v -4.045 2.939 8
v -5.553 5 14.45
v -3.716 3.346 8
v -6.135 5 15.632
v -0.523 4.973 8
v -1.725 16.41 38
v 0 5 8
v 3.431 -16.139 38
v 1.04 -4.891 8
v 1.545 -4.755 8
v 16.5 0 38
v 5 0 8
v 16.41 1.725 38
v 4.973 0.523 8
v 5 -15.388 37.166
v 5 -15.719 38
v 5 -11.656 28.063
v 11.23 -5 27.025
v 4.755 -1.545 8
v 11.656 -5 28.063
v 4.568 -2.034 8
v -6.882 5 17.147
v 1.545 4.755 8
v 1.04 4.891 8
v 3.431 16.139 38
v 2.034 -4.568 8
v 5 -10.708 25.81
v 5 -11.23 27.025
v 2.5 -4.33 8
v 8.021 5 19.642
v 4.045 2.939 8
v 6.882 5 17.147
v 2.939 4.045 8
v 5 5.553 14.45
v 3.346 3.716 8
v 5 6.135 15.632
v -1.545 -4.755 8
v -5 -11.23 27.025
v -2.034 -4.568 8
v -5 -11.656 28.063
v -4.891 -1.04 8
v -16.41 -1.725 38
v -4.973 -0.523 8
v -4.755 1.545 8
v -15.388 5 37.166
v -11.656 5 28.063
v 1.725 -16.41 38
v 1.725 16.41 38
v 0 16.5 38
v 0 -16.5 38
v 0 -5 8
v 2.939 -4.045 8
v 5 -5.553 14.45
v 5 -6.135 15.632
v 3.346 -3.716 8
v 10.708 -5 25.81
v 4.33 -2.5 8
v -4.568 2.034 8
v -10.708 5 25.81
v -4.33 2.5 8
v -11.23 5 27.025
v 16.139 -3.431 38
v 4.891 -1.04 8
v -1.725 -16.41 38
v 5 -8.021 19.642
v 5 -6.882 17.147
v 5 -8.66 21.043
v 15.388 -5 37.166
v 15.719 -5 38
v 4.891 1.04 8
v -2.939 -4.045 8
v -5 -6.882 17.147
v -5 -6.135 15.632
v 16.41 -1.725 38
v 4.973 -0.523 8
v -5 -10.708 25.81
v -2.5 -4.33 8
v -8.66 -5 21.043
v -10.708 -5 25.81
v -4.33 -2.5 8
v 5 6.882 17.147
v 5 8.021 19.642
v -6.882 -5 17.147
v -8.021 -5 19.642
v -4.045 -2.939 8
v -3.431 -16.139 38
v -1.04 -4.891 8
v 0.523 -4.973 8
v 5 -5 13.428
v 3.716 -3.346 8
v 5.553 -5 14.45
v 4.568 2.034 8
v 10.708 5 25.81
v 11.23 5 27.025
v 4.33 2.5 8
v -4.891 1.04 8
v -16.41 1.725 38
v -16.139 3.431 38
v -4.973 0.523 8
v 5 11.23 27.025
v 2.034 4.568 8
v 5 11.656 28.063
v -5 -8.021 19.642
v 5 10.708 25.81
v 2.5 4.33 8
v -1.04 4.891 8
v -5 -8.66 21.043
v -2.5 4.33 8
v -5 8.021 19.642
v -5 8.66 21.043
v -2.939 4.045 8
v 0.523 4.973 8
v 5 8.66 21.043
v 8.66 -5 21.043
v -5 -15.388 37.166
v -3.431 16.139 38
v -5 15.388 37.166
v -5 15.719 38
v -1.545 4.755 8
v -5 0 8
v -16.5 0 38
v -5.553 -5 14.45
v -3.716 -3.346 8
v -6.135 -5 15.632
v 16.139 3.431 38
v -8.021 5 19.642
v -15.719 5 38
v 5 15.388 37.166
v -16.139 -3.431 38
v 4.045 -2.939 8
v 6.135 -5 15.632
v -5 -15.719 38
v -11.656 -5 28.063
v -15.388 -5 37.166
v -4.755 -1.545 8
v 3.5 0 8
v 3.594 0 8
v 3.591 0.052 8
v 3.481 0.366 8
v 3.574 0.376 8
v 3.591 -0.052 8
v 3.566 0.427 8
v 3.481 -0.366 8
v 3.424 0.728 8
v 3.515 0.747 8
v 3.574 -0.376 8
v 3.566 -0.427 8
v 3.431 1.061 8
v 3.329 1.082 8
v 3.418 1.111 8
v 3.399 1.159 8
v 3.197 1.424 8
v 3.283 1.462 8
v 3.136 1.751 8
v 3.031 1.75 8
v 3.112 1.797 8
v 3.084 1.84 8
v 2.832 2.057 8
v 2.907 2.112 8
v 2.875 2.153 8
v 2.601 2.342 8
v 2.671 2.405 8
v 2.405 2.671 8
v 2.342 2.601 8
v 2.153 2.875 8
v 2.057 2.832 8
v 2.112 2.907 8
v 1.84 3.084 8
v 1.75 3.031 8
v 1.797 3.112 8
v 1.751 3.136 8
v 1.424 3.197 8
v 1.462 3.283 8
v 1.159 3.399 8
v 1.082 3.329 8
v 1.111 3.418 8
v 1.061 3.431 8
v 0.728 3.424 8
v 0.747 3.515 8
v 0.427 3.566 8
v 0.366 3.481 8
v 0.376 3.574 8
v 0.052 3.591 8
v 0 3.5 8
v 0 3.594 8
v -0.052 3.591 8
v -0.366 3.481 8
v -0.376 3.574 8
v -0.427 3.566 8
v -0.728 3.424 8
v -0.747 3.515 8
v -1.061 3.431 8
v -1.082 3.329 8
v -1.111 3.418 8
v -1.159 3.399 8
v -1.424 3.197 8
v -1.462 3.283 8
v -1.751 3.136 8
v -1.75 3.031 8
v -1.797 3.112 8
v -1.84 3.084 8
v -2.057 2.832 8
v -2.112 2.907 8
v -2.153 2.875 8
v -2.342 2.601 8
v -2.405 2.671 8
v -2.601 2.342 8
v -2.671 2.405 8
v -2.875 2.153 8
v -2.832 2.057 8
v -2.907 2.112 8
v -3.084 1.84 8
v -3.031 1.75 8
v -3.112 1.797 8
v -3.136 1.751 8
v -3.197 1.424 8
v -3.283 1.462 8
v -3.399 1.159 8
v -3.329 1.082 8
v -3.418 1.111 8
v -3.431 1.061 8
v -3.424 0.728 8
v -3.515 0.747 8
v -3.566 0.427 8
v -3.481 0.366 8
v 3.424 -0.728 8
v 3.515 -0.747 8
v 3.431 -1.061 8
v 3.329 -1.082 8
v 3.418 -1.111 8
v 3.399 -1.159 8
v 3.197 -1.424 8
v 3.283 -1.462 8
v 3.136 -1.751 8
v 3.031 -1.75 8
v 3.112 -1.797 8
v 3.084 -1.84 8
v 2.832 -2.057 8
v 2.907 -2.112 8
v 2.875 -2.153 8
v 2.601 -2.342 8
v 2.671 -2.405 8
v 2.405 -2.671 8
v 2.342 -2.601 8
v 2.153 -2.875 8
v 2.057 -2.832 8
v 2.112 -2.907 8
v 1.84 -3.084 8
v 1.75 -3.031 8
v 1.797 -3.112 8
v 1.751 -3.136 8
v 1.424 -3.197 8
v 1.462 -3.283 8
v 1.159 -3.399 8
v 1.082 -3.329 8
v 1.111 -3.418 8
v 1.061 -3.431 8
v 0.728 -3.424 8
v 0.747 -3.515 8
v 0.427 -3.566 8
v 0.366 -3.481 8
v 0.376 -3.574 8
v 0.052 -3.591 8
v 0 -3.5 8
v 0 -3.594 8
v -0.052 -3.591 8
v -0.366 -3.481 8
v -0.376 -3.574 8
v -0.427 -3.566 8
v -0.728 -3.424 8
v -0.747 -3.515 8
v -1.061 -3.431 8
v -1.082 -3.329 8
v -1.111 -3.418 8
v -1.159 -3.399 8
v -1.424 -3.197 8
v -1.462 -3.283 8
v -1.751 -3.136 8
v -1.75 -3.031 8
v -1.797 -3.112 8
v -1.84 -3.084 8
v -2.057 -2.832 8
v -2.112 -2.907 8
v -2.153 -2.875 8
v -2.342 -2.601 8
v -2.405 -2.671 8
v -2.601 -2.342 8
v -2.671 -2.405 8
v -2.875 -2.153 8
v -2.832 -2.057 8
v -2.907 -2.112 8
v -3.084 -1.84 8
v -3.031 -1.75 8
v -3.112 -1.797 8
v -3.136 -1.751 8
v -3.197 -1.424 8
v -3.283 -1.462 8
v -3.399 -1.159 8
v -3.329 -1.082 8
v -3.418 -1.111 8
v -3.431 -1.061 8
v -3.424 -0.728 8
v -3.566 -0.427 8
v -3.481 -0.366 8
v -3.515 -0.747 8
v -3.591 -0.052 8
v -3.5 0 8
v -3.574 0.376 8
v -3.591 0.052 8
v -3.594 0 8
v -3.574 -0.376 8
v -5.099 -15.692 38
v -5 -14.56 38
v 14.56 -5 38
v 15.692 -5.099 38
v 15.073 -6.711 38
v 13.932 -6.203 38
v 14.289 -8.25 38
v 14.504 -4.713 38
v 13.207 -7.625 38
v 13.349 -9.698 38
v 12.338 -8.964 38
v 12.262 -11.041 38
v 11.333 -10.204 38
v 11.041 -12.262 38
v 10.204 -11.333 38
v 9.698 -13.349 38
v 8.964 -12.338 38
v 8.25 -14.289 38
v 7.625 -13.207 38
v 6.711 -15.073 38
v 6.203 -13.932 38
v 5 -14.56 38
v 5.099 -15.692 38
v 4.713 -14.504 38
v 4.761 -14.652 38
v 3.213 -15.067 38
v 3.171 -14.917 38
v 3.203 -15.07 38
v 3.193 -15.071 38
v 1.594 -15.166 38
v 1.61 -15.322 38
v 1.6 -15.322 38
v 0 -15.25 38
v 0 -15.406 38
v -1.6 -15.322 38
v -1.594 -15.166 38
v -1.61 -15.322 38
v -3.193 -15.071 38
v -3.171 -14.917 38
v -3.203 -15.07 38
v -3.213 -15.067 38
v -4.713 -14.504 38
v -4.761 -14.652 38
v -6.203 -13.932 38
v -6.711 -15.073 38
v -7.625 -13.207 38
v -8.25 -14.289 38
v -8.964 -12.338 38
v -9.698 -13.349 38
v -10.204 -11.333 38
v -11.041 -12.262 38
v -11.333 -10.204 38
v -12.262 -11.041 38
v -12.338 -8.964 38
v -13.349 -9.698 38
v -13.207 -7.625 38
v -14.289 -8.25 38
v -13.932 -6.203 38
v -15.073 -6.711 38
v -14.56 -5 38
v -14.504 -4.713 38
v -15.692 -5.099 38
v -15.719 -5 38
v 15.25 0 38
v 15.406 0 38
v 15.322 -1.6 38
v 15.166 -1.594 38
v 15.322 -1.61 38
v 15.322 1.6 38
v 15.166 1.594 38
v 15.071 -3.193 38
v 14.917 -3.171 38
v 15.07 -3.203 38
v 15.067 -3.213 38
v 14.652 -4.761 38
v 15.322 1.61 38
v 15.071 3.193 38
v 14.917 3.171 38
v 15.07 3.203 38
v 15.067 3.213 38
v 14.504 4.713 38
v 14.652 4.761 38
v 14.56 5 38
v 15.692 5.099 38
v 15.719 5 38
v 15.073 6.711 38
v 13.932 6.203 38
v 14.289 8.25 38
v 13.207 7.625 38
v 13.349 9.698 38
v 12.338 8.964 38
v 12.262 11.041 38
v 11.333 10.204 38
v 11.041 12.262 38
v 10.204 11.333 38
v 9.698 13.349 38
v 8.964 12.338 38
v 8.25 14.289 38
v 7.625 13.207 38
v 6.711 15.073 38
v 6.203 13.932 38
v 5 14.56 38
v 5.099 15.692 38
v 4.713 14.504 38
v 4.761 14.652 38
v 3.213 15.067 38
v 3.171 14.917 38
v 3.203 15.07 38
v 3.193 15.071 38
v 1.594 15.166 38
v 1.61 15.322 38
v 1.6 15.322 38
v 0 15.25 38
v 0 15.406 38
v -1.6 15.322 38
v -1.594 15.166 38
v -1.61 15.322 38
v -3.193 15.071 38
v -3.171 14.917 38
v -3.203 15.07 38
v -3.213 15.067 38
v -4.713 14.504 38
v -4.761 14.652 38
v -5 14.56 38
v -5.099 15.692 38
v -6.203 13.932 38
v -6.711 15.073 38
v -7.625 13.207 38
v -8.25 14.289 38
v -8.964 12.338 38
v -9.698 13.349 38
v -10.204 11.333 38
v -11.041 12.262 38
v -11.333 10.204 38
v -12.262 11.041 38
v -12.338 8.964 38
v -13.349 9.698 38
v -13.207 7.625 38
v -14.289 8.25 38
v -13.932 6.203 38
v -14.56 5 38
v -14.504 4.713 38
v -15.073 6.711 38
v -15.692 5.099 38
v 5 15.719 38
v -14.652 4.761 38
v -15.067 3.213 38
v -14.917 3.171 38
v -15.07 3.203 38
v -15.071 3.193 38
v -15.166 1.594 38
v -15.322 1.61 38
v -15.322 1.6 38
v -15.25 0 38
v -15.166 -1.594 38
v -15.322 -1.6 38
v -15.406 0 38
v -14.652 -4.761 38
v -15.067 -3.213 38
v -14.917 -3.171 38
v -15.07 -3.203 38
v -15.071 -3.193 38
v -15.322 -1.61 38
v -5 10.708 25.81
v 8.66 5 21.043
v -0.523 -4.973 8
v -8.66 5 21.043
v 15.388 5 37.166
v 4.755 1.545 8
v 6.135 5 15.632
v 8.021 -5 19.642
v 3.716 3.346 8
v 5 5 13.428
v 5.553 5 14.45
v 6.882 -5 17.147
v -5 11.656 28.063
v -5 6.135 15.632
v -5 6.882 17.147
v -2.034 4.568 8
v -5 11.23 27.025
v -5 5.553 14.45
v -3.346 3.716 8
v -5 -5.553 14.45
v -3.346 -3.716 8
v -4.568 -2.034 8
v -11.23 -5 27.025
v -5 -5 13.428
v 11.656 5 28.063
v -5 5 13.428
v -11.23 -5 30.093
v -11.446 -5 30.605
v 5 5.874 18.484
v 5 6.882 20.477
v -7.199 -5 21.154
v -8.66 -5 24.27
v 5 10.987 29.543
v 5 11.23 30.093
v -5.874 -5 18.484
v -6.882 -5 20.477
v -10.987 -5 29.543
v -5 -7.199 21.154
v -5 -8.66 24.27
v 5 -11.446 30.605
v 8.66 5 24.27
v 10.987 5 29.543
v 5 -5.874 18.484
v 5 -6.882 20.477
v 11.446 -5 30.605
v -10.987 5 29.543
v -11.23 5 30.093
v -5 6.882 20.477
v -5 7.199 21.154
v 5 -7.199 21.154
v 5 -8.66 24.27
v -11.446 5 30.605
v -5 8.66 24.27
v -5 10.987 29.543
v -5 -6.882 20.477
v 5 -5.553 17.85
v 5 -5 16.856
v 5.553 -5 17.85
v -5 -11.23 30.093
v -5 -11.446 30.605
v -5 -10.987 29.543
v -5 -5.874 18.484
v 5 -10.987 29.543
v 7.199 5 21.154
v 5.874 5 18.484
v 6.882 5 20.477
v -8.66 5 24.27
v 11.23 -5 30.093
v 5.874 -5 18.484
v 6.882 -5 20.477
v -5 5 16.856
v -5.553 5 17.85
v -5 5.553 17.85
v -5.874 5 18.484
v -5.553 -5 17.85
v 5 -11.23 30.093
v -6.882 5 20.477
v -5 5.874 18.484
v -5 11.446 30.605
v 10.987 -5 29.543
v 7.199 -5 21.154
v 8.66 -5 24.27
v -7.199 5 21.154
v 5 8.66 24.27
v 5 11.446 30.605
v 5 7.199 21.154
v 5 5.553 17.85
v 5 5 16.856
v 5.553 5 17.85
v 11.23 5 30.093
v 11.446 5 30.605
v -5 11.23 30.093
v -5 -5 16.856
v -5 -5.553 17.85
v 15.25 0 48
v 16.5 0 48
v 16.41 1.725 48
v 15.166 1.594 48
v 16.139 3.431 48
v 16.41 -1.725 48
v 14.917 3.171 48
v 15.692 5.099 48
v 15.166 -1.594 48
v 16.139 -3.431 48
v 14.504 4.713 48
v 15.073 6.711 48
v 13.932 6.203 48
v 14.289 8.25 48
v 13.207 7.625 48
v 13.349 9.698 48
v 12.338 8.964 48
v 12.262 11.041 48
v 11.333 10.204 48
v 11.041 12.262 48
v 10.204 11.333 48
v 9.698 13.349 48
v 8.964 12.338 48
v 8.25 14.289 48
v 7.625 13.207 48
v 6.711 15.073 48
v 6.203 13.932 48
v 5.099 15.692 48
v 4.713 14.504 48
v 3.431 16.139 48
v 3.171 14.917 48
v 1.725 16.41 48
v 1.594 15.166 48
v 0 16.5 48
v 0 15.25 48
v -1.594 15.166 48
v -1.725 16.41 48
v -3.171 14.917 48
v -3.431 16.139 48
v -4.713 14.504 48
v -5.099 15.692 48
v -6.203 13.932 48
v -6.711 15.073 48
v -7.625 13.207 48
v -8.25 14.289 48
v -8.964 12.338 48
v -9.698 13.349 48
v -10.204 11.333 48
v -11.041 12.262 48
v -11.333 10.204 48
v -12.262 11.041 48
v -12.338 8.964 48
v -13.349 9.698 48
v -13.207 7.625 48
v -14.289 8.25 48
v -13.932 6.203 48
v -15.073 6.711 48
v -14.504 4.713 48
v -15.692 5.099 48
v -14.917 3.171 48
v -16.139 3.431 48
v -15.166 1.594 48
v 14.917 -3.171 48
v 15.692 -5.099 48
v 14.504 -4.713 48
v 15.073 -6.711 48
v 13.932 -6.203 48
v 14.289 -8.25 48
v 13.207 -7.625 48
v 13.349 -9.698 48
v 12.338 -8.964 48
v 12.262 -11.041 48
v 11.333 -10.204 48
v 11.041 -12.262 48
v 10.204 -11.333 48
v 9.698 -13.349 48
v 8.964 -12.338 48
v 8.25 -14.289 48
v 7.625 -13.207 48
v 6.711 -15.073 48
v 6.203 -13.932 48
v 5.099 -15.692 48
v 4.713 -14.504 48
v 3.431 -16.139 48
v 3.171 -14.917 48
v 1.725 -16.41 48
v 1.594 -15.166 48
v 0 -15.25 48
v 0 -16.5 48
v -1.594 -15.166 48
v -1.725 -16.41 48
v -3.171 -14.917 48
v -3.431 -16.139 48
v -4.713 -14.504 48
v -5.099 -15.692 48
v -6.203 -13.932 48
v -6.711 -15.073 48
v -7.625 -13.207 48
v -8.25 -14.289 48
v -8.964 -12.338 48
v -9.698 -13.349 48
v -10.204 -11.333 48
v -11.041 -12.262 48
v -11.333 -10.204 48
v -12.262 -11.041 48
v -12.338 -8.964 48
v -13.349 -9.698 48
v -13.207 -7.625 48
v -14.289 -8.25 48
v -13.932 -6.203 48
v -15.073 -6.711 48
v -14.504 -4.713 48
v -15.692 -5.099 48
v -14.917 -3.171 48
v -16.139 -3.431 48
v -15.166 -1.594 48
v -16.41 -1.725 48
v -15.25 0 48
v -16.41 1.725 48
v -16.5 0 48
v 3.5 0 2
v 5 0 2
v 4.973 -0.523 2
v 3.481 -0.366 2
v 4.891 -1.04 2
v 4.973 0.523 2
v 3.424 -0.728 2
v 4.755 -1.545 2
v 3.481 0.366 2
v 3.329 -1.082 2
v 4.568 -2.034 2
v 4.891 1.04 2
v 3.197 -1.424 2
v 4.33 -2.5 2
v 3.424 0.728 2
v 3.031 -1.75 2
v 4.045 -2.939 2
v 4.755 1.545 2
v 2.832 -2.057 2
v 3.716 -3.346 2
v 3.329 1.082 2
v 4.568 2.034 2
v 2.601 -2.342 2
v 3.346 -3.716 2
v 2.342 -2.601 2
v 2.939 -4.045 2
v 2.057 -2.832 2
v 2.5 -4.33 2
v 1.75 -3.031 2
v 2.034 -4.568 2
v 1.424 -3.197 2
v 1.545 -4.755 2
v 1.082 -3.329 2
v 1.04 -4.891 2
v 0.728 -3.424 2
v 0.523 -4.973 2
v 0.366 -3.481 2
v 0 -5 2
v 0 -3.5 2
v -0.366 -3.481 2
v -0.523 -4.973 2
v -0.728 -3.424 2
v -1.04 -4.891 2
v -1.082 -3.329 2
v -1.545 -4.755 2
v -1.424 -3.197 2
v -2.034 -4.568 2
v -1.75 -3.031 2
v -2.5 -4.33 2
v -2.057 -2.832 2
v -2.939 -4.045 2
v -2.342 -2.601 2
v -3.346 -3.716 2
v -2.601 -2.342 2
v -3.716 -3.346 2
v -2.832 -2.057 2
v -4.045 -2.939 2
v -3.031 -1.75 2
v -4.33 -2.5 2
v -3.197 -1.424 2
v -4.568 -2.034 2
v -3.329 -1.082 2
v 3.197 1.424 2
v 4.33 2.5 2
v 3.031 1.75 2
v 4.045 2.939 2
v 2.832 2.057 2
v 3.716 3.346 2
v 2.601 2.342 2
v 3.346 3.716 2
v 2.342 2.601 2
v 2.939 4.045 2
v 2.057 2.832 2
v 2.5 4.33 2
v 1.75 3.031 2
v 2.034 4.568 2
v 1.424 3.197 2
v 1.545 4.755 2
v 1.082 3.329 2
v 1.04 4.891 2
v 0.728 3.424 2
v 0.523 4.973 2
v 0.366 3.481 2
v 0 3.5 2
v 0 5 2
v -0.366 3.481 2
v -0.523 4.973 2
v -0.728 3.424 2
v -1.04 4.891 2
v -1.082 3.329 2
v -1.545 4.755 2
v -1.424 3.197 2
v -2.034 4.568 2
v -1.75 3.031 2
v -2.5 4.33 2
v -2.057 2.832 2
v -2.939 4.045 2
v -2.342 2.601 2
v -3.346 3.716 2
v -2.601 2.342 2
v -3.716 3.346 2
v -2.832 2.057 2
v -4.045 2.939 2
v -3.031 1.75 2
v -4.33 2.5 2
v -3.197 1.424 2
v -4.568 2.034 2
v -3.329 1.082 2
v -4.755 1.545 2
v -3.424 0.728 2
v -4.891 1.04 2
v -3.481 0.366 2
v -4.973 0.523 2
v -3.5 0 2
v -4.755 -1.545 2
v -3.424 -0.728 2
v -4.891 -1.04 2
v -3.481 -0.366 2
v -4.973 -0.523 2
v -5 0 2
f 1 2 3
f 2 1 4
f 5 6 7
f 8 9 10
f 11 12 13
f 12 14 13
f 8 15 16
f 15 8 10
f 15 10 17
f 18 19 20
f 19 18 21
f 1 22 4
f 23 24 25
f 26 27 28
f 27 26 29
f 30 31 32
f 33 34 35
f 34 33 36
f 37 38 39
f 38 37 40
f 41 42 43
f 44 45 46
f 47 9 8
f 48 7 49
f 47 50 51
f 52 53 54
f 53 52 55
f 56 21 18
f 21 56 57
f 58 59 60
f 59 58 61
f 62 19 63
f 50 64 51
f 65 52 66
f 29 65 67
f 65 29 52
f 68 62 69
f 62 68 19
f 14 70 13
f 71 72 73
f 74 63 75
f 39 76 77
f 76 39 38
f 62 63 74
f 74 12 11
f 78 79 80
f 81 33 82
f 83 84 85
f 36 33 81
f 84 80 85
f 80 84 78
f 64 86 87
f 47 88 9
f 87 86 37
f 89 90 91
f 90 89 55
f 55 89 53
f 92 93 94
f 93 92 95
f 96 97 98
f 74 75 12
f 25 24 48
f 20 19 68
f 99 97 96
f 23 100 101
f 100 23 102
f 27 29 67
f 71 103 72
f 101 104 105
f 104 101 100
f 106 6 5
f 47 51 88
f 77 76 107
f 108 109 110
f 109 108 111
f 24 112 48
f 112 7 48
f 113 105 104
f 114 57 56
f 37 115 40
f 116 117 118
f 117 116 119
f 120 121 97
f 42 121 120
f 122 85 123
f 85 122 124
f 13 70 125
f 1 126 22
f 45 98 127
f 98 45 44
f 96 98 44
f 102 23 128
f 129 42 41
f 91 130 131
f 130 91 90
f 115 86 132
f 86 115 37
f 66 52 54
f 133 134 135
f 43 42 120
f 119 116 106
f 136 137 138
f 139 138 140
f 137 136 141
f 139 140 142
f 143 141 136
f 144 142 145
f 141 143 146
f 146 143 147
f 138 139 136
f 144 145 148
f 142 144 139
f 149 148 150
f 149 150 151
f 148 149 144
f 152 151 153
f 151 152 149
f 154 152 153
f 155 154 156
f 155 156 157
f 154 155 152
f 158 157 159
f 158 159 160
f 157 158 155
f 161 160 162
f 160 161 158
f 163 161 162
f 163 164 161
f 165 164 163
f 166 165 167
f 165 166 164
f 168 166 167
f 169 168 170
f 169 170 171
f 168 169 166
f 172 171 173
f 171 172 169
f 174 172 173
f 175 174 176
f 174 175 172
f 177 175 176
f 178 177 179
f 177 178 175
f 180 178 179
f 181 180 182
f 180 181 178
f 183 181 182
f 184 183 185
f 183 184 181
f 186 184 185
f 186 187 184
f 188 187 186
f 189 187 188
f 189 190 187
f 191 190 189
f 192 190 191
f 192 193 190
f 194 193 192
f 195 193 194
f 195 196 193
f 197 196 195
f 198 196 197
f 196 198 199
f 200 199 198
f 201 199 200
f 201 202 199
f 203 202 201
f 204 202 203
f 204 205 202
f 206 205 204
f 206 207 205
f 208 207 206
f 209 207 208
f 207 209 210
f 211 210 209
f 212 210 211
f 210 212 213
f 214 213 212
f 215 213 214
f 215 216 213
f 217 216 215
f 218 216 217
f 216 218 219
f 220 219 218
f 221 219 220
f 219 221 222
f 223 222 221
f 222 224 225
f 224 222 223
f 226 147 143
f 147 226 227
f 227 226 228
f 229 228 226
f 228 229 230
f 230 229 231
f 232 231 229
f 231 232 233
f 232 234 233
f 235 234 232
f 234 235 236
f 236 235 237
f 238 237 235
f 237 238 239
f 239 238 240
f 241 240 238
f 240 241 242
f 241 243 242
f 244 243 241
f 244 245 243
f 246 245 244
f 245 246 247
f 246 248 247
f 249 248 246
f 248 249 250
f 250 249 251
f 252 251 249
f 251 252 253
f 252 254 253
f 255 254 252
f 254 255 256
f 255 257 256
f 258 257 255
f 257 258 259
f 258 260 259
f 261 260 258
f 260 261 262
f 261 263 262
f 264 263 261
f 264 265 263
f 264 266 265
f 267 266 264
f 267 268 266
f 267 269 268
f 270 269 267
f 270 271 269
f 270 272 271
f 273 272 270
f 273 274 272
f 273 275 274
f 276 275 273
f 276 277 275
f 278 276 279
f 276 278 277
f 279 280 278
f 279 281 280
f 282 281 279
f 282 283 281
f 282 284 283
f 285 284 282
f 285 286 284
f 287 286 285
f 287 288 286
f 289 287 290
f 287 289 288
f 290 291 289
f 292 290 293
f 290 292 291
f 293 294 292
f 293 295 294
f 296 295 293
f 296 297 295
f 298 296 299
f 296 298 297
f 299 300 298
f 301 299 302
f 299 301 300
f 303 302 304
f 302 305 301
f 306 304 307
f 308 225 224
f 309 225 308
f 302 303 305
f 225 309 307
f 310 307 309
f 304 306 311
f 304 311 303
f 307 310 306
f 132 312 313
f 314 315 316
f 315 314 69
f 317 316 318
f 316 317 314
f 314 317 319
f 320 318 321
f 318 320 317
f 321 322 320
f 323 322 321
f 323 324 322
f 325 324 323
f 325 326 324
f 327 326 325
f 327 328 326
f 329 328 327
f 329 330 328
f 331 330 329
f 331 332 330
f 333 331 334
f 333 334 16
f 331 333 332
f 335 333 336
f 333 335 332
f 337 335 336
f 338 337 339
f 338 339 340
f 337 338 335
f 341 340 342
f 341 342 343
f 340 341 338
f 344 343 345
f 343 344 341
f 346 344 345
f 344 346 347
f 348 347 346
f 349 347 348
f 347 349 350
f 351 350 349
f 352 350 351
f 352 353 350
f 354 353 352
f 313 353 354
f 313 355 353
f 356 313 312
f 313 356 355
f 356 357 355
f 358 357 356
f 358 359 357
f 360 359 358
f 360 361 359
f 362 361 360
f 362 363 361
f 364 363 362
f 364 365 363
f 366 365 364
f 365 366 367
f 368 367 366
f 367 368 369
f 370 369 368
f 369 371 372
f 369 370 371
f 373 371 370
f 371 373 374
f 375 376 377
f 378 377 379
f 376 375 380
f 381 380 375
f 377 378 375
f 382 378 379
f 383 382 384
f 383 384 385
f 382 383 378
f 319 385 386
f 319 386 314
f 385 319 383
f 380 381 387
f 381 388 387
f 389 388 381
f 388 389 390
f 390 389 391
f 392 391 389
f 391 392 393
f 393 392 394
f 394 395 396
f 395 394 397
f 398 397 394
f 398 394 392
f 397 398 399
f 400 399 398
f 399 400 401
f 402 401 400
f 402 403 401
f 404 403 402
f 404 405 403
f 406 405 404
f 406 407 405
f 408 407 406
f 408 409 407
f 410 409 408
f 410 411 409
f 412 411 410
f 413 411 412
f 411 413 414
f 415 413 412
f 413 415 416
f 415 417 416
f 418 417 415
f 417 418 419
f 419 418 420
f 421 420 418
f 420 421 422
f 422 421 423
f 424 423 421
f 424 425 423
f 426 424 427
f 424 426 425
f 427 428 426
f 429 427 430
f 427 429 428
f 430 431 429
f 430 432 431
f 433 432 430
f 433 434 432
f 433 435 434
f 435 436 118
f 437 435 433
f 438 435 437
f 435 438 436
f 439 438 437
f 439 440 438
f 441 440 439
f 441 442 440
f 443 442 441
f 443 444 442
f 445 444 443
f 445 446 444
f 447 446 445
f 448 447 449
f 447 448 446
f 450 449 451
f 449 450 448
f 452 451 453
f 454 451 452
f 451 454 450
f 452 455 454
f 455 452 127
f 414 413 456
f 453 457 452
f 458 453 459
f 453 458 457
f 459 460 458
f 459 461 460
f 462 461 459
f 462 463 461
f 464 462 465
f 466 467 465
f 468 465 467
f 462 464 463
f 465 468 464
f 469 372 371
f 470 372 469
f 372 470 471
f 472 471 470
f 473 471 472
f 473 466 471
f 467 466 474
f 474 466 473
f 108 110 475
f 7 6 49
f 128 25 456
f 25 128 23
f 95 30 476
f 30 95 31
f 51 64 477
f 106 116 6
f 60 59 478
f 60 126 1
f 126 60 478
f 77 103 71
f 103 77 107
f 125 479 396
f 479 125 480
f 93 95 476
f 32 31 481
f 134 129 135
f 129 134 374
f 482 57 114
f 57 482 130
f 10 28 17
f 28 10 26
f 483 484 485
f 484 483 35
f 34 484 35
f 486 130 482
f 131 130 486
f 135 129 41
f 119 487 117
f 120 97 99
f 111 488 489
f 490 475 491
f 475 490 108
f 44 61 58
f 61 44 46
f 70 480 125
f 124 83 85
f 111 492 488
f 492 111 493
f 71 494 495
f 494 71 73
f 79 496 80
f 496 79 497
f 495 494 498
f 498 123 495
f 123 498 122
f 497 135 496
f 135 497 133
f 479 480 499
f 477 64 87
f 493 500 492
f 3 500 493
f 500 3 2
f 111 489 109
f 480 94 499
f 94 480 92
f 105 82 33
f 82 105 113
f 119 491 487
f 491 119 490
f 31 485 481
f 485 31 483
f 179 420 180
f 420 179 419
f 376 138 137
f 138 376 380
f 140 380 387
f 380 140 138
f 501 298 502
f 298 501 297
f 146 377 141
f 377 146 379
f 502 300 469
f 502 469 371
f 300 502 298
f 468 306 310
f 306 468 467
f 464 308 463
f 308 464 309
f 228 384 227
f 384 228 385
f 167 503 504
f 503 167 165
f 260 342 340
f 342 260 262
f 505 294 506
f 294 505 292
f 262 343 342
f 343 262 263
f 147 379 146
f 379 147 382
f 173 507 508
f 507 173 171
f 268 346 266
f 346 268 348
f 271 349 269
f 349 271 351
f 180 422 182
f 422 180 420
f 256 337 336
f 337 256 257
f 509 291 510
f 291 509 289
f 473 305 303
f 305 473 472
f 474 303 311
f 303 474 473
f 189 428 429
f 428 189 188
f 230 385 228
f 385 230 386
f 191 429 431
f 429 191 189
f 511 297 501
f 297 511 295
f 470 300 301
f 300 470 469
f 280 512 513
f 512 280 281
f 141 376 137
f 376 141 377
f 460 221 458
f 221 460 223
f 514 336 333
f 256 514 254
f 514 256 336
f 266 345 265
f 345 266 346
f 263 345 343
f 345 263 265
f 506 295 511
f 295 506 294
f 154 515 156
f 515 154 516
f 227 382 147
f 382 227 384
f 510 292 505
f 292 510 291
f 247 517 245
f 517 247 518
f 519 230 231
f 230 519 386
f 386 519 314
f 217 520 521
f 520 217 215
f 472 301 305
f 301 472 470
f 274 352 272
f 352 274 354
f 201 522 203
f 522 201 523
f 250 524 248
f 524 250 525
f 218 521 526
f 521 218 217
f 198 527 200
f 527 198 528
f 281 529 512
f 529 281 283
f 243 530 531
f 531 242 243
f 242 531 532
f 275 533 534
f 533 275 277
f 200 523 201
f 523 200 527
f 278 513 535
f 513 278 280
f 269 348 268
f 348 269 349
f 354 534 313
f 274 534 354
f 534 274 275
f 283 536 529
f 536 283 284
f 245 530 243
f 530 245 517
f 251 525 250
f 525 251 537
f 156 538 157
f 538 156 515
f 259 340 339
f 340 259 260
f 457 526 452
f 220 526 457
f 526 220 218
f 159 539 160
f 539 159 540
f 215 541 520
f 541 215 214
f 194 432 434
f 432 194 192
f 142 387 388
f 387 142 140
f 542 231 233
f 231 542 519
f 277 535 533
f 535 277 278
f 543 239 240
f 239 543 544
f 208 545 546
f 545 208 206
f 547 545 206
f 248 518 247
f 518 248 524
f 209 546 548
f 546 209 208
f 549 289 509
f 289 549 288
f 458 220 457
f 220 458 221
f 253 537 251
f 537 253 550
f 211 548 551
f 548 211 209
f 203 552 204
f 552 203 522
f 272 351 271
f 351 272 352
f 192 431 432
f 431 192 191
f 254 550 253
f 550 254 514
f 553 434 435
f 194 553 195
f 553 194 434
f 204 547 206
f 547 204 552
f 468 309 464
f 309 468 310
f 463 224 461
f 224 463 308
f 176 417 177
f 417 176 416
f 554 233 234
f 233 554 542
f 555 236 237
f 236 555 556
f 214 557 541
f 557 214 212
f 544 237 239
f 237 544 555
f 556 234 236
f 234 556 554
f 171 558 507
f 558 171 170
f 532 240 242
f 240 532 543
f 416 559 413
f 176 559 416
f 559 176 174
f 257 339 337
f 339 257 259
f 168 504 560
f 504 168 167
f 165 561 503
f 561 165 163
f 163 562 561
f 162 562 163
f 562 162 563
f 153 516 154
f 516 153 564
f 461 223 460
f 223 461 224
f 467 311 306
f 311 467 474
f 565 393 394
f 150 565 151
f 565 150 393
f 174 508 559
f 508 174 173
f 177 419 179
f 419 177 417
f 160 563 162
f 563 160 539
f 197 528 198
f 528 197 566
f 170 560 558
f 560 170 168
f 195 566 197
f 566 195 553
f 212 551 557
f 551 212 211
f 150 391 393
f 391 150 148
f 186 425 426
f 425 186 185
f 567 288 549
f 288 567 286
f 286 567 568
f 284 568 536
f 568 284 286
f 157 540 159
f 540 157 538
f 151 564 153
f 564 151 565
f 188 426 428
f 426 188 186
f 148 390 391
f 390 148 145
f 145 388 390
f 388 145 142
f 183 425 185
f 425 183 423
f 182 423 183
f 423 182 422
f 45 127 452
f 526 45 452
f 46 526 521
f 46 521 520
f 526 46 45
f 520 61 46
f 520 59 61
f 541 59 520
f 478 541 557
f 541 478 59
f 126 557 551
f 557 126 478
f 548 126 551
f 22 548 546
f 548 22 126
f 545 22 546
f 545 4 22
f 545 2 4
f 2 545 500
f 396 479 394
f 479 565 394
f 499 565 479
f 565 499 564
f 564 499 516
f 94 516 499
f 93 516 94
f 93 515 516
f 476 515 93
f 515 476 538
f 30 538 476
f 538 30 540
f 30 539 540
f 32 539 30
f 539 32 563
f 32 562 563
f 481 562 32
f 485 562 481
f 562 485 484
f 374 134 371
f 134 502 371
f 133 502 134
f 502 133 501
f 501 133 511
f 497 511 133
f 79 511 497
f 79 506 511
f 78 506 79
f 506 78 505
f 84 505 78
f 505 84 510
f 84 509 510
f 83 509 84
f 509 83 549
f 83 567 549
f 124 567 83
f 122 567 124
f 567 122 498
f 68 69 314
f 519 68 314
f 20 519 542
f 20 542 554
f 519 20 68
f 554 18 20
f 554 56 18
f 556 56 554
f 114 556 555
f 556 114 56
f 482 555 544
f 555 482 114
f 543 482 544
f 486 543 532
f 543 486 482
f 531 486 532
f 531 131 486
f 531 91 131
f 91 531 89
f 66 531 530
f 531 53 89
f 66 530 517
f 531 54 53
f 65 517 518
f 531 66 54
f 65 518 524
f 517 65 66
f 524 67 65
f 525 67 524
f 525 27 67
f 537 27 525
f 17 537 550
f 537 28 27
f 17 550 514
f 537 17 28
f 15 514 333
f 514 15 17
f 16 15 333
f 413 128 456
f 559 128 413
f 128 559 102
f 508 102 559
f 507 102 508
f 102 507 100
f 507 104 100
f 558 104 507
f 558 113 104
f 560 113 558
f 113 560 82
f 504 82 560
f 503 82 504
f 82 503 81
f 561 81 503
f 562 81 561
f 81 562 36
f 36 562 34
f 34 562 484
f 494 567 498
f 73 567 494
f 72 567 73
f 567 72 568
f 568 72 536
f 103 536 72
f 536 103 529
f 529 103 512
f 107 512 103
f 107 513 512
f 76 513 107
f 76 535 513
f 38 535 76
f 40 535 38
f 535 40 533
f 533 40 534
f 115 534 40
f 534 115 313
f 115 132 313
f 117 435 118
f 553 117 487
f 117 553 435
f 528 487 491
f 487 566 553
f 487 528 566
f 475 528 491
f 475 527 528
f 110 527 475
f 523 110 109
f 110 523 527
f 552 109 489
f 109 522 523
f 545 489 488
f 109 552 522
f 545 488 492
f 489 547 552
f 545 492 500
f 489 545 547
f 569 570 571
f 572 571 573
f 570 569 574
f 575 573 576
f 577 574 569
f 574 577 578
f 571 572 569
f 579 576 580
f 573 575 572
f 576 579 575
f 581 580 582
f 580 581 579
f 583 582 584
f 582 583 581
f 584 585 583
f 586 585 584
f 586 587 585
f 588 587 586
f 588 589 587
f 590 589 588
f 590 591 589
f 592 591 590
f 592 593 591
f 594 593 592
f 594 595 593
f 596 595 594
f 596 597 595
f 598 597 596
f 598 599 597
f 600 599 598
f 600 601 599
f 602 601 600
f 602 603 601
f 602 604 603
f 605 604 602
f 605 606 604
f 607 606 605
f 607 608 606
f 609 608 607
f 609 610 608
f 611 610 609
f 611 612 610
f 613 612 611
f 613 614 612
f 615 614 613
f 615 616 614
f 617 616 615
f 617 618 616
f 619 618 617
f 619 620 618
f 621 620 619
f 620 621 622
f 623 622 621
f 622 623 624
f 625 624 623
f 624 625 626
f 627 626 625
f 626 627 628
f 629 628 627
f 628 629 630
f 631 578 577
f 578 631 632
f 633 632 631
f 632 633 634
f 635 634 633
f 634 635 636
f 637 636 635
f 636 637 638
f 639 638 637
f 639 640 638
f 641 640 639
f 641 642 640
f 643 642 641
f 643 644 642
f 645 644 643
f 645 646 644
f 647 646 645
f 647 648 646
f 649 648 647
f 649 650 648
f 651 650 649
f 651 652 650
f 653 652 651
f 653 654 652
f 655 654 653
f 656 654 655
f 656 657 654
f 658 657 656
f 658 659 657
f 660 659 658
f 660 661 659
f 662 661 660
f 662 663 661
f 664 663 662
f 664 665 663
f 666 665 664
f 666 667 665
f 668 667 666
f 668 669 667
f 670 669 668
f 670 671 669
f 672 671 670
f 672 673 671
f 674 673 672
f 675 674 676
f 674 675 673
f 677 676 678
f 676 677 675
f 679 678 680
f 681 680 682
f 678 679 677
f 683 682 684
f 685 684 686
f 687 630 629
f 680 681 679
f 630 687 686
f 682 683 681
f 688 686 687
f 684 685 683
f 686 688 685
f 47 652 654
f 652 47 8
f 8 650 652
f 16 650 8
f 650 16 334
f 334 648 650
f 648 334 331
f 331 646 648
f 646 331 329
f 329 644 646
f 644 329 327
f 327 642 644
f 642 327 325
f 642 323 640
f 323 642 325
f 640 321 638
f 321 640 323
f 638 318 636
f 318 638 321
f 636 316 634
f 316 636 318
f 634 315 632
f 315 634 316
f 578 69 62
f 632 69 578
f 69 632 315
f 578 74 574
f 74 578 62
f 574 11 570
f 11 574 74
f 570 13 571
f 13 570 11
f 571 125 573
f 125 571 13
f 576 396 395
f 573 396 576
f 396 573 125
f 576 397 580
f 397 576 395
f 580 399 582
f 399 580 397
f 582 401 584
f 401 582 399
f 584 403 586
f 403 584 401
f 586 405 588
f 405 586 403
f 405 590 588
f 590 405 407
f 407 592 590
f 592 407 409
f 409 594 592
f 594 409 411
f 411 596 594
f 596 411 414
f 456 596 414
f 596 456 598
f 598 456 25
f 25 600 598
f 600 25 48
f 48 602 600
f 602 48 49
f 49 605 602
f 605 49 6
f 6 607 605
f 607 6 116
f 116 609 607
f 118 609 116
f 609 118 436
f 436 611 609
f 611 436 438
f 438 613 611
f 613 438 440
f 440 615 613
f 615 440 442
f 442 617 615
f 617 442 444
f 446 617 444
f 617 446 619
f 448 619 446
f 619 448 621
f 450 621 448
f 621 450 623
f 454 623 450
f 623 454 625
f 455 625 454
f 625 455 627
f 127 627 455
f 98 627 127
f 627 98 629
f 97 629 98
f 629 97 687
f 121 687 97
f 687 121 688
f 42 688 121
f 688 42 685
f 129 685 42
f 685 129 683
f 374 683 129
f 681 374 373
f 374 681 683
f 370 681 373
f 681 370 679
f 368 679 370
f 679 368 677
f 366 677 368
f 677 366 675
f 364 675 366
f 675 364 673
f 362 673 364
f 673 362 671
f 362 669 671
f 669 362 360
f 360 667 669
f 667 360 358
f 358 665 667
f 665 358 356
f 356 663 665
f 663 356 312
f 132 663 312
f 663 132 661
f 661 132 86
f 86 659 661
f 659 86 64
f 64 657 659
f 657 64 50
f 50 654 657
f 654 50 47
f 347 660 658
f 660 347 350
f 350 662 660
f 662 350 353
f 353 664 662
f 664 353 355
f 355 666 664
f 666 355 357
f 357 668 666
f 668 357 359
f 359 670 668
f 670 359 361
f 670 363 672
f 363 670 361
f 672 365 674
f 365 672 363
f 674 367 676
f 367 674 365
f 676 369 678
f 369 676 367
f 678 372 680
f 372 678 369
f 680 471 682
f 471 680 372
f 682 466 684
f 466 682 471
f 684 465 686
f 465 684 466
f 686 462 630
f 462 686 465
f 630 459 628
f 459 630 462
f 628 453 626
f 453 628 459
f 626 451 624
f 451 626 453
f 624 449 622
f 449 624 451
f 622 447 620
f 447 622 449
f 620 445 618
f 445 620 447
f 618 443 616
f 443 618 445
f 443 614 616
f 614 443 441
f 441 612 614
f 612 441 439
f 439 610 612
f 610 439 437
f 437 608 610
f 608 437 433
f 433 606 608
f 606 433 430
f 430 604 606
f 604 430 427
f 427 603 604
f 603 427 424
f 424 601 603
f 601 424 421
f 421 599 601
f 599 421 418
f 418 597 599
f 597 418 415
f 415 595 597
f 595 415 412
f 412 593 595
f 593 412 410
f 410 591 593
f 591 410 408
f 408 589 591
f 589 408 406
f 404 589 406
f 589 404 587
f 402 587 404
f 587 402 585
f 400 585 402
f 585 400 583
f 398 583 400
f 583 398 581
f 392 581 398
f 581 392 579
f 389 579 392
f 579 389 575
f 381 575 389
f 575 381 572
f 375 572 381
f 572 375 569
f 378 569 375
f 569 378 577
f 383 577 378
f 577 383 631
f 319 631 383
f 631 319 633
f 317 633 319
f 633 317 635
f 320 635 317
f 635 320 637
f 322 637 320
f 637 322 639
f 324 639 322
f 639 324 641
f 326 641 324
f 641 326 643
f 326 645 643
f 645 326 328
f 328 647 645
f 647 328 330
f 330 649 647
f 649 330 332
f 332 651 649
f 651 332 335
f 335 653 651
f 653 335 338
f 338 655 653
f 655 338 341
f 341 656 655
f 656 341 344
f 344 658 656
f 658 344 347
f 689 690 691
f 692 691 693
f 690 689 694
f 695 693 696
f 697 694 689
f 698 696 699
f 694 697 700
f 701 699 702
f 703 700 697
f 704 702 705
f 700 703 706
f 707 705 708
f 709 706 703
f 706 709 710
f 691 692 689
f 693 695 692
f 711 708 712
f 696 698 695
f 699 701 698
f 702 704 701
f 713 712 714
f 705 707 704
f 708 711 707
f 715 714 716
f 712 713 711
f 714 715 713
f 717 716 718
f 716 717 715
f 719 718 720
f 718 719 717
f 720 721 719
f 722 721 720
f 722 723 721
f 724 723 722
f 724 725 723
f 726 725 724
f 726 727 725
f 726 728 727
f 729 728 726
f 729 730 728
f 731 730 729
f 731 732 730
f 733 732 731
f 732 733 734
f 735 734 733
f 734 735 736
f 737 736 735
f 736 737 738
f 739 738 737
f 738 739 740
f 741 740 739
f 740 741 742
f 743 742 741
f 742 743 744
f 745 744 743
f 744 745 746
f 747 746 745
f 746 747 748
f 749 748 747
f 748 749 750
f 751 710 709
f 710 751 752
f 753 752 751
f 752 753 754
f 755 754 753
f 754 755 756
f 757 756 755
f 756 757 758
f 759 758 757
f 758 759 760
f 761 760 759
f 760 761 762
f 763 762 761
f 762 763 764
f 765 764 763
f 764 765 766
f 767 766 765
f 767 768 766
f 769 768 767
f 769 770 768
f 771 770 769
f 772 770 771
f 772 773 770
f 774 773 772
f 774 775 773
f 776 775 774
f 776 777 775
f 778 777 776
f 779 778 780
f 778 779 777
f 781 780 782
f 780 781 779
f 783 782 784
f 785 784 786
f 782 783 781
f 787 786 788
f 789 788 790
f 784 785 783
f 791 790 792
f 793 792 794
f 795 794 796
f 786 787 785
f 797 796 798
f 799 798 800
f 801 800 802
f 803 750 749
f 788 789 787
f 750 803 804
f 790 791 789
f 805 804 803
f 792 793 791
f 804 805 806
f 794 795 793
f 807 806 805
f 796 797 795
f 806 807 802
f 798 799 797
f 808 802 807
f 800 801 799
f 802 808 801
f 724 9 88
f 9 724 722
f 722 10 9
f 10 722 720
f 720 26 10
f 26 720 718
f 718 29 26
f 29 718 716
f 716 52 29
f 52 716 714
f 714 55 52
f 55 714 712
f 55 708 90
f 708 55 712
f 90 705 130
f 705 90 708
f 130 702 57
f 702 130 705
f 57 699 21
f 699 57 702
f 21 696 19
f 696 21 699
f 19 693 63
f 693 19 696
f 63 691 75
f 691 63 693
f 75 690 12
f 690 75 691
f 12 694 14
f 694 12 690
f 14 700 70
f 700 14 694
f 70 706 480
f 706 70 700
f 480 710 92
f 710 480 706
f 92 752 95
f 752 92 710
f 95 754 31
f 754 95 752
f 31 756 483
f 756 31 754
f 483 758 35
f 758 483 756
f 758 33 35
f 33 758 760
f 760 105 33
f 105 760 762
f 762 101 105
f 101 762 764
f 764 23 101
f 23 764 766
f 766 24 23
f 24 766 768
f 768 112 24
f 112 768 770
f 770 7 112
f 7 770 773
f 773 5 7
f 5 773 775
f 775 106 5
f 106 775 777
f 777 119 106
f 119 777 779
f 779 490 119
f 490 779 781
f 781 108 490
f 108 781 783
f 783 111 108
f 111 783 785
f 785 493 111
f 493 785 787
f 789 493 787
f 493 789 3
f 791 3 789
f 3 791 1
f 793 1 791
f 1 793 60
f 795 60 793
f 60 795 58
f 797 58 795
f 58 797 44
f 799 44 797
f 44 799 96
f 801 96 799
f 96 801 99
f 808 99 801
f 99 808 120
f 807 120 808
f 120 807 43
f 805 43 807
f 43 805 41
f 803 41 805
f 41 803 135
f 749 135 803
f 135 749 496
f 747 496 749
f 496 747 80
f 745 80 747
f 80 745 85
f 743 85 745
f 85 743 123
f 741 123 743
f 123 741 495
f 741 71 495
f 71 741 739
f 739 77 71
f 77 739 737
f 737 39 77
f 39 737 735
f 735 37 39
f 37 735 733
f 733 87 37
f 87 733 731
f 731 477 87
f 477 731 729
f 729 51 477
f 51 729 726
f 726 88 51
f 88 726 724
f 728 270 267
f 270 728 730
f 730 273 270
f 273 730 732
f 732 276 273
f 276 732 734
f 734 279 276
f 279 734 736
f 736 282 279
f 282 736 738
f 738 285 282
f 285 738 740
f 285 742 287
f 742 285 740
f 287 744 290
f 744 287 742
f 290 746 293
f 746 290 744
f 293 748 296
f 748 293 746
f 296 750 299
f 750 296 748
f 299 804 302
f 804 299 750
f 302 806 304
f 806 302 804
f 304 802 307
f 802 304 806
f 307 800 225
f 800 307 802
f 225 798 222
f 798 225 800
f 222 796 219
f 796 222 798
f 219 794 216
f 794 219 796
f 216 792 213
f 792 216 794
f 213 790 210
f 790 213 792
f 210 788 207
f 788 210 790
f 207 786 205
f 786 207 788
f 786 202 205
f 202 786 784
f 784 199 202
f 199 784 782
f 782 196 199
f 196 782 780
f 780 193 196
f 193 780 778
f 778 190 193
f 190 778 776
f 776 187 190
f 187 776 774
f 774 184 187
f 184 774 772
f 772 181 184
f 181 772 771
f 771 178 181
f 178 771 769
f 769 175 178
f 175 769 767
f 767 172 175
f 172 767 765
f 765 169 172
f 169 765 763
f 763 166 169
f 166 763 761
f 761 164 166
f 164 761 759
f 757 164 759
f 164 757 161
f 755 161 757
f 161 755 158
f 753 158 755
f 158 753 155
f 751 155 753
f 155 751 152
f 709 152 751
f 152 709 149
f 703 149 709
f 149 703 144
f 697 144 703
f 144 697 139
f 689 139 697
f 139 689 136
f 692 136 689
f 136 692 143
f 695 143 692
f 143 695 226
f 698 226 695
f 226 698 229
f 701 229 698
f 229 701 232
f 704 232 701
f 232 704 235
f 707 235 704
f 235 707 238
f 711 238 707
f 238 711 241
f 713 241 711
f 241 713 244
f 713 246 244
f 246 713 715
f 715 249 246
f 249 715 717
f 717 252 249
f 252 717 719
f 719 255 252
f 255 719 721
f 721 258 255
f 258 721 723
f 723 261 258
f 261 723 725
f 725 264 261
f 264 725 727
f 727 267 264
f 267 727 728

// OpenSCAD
$fn = 60;

*linear_extrude(3.5)
difference(){
    circle(5);
    circle(3.3 + 0.2);
}

translate([0,0, 30 + 8])
linear_extrude(10)
difference(){
    circle(33 / 2);
    circle(30.5 / 2);
}


translate([0,0,2])
linear_extrude(6)
difference(){
    //circle(7 / 2);
    //circle(3.4 / 2 -0.1);
    circle(5);
    circle(3.3 + 0.2);
}

intersection() {
    difference() {
        translate([0,0,8])
        cylinder(30, 5, 16.5);
        
        translate([0,0,7])
        cylinder(32, 3.2, 15.8);
    }
    
    union(){
        cube([40,10, 100], center=true);
        cube([10,40, 100], center=true);
    }
}
